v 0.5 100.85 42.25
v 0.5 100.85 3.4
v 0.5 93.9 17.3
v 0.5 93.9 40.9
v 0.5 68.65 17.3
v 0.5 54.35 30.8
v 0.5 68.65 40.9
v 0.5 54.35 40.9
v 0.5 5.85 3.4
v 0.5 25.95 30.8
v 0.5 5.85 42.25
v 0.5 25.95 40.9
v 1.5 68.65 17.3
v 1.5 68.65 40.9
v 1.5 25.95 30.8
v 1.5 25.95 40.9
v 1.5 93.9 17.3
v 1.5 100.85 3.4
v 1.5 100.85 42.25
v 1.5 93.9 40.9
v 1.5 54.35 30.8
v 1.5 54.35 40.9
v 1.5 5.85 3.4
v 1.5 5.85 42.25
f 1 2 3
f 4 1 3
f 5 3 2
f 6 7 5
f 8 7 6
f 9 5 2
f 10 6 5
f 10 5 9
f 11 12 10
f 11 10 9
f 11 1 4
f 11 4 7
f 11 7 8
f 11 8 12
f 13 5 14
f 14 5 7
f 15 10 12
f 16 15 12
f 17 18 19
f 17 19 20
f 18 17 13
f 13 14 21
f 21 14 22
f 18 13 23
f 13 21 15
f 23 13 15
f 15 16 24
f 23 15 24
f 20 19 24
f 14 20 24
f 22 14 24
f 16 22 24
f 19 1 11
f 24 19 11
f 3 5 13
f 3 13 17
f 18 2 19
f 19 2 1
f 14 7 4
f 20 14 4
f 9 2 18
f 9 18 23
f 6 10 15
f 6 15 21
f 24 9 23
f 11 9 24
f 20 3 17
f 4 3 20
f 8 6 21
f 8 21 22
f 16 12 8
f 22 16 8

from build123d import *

# Parameters (mm, degrees)
SKETCH_1_W          = 95
SKETCH_1_H          = 38.85
EXTRUDE_1_DEPTH     = 1
SKETCH_2_W          = 10.1
SKETCH_2_H          = 28.4
SKETCH_2_W_2        = 23.6
SKETCH_2_H_2        = 25.25
CUT_EXTRUDE_1_DEPTH = 10


with BuildPart() as part:
    # Эскиз1 → Бобышка-Вытянуть1 (new body)
    with BuildSketch(Plane(origin=(0.5, 0, 0), x_dir=(0, -1, 0), z_dir=(-1, 0, 0))):
        with Locations((-53.35, 22.825)):
            Rectangle(SKETCH_1_W, SKETCH_1_H)
    extrude(amount=-EXTRUDE_1_DEPTH)

    # Эскиз2 → Вырез-Вытянуть1 (cut)
    with BuildSketch(Plane.ZY.offset(-0.5)):
        with Locations((35.85, 40.15)):
            Rectangle(SKETCH_2_W, SKETCH_2_H)
        with Locations((29.1, 81.275)):
            Rectangle(SKETCH_2_W_2, SKETCH_2_H_2)
    extrude(amount=-CUT_EXTRUDE_1_DEPTH, mode=Mode.SUBTRACT)


solid = part.part
